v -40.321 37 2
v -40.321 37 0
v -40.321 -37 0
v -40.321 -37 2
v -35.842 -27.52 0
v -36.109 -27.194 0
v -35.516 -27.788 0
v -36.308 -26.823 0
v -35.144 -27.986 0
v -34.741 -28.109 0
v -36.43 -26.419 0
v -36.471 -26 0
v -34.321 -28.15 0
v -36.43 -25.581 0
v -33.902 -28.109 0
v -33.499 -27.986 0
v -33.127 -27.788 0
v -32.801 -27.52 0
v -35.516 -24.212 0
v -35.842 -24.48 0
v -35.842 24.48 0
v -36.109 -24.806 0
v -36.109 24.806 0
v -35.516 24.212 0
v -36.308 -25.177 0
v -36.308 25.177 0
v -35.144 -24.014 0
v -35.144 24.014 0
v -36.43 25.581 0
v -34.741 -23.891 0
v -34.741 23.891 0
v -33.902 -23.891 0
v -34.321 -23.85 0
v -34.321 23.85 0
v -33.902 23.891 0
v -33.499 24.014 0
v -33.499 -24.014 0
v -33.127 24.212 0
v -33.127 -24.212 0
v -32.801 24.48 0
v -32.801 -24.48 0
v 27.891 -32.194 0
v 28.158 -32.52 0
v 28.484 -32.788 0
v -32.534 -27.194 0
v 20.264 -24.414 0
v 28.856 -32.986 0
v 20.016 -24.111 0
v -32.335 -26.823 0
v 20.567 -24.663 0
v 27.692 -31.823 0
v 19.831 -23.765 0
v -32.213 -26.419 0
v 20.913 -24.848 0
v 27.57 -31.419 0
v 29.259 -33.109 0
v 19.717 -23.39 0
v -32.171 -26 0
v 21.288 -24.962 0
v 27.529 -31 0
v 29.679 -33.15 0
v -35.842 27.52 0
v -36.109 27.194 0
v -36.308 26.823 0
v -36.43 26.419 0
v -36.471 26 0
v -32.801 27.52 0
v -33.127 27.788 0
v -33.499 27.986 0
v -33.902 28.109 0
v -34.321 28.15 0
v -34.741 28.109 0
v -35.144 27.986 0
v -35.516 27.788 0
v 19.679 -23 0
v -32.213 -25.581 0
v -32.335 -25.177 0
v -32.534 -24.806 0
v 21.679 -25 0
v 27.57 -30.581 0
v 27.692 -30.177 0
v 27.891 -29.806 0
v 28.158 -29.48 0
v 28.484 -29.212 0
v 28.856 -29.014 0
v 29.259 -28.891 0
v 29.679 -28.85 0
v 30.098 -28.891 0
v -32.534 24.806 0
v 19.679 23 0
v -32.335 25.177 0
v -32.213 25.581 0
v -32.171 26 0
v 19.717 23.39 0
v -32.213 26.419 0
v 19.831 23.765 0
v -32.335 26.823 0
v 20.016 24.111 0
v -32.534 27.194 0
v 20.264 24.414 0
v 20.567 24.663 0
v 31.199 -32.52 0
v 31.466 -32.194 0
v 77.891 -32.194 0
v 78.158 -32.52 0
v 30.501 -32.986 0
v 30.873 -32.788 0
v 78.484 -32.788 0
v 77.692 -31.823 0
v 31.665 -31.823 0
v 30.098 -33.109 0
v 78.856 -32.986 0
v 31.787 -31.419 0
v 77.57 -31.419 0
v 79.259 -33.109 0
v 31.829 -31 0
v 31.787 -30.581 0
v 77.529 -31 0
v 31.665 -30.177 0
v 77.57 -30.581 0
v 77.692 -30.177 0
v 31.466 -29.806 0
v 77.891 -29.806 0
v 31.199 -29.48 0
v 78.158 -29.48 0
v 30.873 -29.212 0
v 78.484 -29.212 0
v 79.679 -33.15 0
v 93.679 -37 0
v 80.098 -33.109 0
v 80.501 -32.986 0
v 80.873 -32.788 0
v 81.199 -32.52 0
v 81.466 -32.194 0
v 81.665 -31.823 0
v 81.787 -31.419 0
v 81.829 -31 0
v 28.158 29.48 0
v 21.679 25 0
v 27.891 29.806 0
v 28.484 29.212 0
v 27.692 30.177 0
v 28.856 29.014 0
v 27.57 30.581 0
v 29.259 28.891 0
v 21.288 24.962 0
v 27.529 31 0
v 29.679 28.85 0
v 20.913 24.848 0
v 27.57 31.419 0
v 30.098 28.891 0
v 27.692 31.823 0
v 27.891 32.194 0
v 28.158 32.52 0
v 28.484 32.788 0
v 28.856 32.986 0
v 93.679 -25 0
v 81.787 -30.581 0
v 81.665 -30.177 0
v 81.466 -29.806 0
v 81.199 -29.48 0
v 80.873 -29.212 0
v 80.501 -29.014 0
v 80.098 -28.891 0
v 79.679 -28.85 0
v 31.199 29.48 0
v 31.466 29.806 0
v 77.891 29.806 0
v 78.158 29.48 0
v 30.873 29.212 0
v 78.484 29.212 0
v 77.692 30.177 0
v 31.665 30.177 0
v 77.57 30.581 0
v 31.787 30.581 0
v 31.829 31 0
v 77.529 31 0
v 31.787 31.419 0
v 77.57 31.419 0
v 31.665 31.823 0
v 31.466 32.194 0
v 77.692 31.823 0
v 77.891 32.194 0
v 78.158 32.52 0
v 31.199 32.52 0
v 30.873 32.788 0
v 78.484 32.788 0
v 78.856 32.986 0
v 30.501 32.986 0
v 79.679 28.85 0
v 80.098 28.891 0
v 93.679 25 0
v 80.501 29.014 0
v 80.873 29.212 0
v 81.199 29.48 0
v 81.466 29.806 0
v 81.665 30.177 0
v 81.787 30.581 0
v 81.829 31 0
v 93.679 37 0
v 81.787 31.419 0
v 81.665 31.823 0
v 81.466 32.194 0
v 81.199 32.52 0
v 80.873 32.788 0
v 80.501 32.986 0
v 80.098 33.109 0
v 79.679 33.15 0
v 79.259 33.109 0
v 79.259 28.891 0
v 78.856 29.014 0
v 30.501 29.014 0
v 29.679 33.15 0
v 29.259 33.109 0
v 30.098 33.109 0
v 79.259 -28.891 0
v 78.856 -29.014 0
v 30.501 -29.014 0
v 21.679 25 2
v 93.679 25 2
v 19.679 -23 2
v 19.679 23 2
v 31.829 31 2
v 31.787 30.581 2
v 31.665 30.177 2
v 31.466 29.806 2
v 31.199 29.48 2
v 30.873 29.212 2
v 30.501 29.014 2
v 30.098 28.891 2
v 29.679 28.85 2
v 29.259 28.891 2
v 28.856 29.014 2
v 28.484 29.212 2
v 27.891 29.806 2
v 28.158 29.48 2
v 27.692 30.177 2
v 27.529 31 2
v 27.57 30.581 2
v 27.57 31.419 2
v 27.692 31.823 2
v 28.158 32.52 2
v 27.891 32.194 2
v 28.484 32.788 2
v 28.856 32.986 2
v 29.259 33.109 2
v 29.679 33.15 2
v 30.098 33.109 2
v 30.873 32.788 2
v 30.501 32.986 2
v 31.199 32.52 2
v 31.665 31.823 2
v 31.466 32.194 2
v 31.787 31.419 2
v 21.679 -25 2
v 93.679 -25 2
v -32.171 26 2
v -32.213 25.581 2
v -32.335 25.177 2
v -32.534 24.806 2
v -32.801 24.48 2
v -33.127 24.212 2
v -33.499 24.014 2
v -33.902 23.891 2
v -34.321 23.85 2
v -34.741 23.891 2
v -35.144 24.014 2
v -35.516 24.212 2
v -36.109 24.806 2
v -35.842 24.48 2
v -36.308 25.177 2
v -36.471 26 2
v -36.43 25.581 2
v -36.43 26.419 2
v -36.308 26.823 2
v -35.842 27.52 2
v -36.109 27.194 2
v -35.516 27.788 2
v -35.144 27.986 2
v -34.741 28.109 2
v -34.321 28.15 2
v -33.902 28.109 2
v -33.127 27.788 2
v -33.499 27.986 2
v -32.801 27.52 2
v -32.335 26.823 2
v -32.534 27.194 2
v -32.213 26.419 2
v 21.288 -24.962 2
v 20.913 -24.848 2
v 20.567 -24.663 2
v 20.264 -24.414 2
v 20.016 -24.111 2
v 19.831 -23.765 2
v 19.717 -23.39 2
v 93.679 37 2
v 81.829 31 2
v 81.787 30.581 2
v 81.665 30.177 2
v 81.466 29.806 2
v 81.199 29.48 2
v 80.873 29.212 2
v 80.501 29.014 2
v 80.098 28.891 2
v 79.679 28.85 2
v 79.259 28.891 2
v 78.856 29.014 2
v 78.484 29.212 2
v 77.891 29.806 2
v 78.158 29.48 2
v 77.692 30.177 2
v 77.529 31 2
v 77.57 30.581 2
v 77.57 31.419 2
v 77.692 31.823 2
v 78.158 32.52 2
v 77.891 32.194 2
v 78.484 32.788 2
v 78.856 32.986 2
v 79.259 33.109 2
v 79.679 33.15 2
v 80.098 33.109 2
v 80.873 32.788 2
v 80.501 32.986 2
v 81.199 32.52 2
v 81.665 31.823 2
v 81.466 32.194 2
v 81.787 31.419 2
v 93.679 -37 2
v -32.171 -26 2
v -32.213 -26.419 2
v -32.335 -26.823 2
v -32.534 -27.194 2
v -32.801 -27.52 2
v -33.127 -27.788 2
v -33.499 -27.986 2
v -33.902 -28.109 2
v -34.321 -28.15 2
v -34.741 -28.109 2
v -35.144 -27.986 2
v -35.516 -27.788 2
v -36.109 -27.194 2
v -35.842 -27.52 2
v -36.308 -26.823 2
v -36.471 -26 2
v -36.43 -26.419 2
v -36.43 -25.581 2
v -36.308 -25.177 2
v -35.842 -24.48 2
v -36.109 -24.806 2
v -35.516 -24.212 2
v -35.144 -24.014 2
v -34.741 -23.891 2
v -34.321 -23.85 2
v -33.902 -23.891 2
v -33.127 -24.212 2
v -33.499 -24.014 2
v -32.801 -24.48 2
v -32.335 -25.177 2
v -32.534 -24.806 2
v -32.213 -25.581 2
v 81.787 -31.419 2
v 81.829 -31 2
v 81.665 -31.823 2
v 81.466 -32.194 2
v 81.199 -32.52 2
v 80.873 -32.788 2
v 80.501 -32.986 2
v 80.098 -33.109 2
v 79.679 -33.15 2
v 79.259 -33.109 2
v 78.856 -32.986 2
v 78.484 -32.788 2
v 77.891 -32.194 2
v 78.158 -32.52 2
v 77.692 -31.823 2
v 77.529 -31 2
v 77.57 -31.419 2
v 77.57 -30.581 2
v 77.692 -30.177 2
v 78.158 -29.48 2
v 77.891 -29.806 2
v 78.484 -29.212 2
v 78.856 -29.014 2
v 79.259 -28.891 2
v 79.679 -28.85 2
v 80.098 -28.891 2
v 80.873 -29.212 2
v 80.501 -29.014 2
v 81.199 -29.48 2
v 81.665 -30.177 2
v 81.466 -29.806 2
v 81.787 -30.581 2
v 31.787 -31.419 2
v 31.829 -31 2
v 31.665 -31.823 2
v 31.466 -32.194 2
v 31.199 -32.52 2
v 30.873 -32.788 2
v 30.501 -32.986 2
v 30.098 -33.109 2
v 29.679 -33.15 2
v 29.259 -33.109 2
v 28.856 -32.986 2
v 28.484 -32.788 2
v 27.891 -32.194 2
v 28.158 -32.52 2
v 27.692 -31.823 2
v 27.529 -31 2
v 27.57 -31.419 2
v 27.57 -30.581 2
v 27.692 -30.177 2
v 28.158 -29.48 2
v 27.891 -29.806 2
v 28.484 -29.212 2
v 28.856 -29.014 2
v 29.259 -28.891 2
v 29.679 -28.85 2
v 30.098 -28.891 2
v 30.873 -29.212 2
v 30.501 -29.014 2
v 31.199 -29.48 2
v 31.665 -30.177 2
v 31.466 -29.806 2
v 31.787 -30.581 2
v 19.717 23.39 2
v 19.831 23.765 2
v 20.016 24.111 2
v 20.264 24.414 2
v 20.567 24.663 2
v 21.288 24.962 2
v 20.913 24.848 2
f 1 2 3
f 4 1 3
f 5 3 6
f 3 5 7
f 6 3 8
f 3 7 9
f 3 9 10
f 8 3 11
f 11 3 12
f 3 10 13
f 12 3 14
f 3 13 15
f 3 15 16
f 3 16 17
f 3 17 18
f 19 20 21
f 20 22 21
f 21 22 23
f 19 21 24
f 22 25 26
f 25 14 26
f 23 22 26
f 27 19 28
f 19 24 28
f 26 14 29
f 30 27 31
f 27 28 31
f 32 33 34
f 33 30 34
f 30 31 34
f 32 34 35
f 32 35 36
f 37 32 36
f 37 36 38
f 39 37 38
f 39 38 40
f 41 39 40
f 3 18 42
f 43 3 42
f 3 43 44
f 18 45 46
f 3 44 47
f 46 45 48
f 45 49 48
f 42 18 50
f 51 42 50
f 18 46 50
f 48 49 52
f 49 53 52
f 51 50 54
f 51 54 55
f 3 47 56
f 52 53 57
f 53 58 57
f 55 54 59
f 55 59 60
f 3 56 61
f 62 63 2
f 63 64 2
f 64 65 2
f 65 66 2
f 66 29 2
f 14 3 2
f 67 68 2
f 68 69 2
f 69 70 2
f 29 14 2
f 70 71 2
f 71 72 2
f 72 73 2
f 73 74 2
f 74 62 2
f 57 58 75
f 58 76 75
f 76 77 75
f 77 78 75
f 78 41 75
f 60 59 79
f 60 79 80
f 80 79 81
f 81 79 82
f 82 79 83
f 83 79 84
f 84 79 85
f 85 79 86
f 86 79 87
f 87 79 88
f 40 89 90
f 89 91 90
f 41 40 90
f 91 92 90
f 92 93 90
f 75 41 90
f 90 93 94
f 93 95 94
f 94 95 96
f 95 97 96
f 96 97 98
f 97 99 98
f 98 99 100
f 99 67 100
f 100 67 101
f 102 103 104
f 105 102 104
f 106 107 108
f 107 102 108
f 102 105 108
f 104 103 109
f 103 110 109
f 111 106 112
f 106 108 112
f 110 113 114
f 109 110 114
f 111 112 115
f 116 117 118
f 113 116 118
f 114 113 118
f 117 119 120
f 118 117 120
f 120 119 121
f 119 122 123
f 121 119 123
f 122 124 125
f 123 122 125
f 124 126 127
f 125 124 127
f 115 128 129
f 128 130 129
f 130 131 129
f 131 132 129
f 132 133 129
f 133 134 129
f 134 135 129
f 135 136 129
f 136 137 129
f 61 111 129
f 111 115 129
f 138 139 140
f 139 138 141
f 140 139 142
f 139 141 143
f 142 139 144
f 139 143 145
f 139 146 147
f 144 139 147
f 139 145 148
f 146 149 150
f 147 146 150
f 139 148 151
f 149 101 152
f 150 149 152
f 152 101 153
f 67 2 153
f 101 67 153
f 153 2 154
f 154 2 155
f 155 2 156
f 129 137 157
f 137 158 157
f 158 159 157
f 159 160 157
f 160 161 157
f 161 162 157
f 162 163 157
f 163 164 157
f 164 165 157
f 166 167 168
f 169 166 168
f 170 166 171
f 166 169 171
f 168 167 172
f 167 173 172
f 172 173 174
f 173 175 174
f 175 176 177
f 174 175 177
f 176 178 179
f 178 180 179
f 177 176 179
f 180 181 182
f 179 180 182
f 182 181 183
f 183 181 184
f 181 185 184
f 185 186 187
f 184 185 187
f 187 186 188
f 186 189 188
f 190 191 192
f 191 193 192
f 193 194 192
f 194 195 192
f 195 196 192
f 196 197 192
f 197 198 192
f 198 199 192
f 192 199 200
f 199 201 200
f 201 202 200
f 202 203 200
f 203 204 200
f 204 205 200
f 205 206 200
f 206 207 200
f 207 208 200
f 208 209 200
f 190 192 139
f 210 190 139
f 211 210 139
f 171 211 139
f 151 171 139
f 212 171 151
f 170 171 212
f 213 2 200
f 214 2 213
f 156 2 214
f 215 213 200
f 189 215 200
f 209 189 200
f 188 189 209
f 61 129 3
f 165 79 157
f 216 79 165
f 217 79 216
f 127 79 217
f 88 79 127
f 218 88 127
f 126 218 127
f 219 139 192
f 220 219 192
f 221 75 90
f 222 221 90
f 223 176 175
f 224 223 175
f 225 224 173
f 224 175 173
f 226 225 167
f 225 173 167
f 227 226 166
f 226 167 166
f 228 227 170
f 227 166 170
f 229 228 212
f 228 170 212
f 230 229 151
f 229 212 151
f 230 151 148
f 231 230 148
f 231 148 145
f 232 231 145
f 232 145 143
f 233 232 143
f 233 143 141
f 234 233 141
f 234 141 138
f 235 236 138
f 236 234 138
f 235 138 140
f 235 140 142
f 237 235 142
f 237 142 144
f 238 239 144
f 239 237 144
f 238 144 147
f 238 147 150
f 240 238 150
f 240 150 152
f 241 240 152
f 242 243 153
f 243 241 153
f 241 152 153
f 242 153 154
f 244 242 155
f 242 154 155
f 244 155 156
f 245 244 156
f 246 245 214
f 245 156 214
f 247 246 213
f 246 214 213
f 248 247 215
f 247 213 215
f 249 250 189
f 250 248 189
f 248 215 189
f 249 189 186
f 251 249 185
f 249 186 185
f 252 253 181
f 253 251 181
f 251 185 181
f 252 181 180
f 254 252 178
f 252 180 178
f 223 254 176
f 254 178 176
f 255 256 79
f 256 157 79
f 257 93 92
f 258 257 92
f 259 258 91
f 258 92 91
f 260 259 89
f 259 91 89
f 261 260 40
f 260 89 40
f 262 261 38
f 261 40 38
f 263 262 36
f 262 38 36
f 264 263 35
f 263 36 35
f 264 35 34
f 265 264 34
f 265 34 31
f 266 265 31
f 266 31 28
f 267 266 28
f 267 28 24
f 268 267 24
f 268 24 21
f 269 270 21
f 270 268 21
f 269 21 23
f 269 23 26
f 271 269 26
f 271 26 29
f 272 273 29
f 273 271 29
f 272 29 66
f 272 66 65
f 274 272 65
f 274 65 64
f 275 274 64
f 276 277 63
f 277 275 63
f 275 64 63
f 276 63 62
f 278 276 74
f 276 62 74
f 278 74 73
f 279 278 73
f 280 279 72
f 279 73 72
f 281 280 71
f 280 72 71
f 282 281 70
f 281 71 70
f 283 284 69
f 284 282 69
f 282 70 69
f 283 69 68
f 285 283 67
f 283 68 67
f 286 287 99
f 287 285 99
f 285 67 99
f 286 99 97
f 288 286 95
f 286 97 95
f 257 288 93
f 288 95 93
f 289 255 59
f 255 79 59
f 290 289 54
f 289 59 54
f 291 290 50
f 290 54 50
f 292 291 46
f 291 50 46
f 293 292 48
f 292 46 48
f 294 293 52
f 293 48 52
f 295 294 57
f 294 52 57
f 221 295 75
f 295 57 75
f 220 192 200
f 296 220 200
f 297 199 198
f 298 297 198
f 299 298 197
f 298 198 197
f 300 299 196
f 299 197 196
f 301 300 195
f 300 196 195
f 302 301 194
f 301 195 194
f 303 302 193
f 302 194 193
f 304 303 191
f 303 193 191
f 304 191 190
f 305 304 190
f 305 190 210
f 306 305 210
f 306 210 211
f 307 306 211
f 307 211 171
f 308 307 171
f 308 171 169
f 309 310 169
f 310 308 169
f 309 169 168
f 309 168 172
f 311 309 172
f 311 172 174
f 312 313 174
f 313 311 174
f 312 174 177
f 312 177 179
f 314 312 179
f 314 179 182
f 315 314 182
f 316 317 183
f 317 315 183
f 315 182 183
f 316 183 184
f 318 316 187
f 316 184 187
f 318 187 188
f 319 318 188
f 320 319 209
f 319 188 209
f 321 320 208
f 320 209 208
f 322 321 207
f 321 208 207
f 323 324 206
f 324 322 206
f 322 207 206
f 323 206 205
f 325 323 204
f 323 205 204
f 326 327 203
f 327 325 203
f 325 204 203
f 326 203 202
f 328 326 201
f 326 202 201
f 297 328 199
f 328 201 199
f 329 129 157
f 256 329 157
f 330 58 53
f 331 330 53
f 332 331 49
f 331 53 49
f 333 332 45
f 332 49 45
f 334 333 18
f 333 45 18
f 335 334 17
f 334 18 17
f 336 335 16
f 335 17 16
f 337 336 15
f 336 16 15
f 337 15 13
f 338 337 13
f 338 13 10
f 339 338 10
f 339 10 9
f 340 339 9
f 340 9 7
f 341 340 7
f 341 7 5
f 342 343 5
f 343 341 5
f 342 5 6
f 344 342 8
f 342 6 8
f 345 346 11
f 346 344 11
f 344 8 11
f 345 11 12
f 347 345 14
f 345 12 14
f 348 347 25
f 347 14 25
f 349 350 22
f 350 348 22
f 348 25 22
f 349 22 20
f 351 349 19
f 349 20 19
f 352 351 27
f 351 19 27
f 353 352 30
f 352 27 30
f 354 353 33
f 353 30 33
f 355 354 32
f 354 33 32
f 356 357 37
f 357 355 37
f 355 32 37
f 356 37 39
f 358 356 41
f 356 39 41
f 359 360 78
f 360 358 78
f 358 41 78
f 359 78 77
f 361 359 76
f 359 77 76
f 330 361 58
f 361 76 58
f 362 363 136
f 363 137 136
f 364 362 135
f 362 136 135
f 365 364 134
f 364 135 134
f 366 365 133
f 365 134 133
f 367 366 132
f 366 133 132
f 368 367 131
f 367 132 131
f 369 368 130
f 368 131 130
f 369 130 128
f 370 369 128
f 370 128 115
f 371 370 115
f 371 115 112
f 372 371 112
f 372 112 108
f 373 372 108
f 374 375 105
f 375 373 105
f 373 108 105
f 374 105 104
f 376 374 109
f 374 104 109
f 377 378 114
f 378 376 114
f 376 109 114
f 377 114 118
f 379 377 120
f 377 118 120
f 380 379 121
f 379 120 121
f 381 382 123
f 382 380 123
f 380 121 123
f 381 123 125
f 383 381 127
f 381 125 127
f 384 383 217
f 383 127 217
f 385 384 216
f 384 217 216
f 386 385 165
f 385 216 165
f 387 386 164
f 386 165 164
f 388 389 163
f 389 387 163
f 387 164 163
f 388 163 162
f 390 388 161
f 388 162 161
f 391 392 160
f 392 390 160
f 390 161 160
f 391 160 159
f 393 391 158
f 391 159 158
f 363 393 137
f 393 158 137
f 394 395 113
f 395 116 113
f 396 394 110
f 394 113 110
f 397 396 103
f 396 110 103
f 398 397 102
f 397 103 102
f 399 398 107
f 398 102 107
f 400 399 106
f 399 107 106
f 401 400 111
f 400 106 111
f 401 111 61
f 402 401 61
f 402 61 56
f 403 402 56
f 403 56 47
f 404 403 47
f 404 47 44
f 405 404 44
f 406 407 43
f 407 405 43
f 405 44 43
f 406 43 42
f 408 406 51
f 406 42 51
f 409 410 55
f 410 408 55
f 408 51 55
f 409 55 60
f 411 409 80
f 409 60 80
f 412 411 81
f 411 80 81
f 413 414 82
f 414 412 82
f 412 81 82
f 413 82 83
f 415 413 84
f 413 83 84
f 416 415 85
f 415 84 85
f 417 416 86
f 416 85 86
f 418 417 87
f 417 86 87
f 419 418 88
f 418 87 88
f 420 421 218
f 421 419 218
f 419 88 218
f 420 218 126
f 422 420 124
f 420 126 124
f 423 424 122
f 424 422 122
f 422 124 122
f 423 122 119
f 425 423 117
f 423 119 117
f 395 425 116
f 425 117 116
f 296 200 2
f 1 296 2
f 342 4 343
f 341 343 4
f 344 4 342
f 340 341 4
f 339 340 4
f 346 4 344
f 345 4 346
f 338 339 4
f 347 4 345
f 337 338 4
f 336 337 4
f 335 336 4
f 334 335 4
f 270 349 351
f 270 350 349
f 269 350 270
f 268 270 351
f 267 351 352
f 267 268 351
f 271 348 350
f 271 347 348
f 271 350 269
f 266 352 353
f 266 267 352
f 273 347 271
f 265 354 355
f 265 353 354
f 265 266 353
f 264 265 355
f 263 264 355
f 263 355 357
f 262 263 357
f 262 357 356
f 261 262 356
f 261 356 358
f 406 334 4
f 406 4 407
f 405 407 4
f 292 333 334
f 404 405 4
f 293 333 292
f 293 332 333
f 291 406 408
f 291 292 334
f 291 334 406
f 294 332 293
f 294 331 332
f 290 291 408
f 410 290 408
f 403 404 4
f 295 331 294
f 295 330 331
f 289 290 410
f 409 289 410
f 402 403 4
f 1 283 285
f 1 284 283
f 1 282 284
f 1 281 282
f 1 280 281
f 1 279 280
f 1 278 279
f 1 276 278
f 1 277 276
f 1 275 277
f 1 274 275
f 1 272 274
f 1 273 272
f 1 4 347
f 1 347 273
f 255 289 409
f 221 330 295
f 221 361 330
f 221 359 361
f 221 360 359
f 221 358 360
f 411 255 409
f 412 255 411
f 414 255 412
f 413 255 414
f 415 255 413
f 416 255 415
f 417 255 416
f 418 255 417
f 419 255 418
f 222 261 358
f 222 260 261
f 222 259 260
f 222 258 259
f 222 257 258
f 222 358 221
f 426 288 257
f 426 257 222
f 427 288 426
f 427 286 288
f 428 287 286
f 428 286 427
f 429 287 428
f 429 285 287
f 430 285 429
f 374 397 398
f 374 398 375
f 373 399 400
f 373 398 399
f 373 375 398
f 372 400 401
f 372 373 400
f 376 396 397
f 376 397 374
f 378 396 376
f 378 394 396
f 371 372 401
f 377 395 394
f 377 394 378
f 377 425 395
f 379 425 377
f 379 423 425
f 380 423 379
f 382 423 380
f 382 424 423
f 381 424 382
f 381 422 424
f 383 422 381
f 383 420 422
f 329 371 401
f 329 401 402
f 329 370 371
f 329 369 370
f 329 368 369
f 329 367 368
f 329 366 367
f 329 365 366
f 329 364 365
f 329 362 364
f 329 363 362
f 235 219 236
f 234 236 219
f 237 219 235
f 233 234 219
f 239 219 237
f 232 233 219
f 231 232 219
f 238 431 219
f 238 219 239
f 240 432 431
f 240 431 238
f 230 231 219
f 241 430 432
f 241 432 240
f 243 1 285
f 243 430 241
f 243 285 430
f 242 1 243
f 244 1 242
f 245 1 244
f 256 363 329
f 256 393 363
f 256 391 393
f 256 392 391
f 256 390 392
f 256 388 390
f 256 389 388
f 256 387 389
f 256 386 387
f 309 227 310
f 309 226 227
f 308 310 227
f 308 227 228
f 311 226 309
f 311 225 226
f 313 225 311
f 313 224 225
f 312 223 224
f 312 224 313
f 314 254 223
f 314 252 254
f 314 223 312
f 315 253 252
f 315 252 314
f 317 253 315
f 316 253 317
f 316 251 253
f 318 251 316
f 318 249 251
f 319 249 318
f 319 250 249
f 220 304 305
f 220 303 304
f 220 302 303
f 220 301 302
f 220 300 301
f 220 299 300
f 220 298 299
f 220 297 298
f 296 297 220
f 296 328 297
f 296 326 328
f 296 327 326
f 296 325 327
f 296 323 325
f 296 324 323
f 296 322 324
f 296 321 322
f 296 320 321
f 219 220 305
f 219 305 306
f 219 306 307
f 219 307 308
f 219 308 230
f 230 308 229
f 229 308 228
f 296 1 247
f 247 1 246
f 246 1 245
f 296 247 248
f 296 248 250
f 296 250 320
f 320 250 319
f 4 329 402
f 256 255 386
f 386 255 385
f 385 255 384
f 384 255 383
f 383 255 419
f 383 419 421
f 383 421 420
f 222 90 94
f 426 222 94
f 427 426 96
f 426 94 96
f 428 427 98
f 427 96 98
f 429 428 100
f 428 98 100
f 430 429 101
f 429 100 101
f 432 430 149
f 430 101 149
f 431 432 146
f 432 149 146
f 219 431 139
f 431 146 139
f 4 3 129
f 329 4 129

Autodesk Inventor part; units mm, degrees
ref_plane "YZ Plane" through (0, 0, 0) normal (1, 0, 0) x (0, 1, 0)
ref_plane "XZ Plane" through (0, 0, 0) normal (0, 1, 0) x (-1, 0, 0)
ref_plane "XY Plane" through (0, 0, 0) normal (0, 0, 1) x (1, 0, 0)
sketch "Sketch2" plane through (0, 0, 0) normal (0, 0, 1) x (1, 0, 0)
  line L0 (-40.3214, -37) -> (93.6786, -37)
  line L1 (93.6786, -37) -> (93.6786, -25)
  line L2 (93.6786, -25) -> (21.6786, -25)
  line L3 (19.6786, -23) -> (19.6786, 23)
  line L4 (21.6786, 25) -> (93.6786, 25)
  line L5 (93.6786, 25) -> (93.6786, 37)
  line L6 (93.6786, 37) -> (-40.3214, 37)
  line L7 (-40.3214, 37) -> (-40.3214, -37)
  arc A0 (21.6786, 25) -> (19.6786, 23) centre (21.6786, 23) ccw
  arc A1 (19.6786, -23) -> (21.6786, -25) centre (21.6786, -23) ccw
  circle A2 centre (-34.3214, 26) radius 2.15
  circle A3 centre (-34.3214, -26) radius 2.15
  circle A4 centre (29.6786, 31) radius 2.15
  circle A5 centre (79.6786, 31) radius 2.15
  circle A6 centre (79.6786, -31) radius 2.15
  circle A7 centre (29.6786, -31) radius 2.15
  point P0 (0, 0)
  dimension "d39" = 74
  dimension "d42" = 37
  dimension "d43" = 50
  dimension "d44" = 25
  dimension "d45" = 60
  dimension "d46" = 74
  dimension "d47" = 74
  dimension "d48" = 11
  dimension "d49" = 11
  dimension "d50" = 6
  dimension "d51" = 6
  dimension "d52" = 6
  dimension "d53" = 6
  dimension "d54" = 6
  dimension "d55" = 6
  dimension "d56" = 14
  dimension "d57" = 64
  dimension "d58" = 64
  dimension "d59" = 14
  dimension "d60" = 2
  dimension "d61" = 4.3
  dimension "d62" = 4.3
  dimension "d63" = 4.3
  dimension "d64" = 4.3
  dimension "d65" = 4.3
  dimension "d66" = 4.3
  dimension "d69" = 52
  dimension "d70" = 134
extrude "Extrusion4" add sketch "Sketch2" along normal blind 2
equation "\"d42\" = 0.5 * d39"
equation "\"d44\" = 0.5 * d43"
equation "\"d62\" = d61"
equation "\"d63\" = d61"
equation "\"d64\" = d61"
equation "\"d65\" = d61"
equation "\"d66\" = d61"
properties part number "top support extension"
